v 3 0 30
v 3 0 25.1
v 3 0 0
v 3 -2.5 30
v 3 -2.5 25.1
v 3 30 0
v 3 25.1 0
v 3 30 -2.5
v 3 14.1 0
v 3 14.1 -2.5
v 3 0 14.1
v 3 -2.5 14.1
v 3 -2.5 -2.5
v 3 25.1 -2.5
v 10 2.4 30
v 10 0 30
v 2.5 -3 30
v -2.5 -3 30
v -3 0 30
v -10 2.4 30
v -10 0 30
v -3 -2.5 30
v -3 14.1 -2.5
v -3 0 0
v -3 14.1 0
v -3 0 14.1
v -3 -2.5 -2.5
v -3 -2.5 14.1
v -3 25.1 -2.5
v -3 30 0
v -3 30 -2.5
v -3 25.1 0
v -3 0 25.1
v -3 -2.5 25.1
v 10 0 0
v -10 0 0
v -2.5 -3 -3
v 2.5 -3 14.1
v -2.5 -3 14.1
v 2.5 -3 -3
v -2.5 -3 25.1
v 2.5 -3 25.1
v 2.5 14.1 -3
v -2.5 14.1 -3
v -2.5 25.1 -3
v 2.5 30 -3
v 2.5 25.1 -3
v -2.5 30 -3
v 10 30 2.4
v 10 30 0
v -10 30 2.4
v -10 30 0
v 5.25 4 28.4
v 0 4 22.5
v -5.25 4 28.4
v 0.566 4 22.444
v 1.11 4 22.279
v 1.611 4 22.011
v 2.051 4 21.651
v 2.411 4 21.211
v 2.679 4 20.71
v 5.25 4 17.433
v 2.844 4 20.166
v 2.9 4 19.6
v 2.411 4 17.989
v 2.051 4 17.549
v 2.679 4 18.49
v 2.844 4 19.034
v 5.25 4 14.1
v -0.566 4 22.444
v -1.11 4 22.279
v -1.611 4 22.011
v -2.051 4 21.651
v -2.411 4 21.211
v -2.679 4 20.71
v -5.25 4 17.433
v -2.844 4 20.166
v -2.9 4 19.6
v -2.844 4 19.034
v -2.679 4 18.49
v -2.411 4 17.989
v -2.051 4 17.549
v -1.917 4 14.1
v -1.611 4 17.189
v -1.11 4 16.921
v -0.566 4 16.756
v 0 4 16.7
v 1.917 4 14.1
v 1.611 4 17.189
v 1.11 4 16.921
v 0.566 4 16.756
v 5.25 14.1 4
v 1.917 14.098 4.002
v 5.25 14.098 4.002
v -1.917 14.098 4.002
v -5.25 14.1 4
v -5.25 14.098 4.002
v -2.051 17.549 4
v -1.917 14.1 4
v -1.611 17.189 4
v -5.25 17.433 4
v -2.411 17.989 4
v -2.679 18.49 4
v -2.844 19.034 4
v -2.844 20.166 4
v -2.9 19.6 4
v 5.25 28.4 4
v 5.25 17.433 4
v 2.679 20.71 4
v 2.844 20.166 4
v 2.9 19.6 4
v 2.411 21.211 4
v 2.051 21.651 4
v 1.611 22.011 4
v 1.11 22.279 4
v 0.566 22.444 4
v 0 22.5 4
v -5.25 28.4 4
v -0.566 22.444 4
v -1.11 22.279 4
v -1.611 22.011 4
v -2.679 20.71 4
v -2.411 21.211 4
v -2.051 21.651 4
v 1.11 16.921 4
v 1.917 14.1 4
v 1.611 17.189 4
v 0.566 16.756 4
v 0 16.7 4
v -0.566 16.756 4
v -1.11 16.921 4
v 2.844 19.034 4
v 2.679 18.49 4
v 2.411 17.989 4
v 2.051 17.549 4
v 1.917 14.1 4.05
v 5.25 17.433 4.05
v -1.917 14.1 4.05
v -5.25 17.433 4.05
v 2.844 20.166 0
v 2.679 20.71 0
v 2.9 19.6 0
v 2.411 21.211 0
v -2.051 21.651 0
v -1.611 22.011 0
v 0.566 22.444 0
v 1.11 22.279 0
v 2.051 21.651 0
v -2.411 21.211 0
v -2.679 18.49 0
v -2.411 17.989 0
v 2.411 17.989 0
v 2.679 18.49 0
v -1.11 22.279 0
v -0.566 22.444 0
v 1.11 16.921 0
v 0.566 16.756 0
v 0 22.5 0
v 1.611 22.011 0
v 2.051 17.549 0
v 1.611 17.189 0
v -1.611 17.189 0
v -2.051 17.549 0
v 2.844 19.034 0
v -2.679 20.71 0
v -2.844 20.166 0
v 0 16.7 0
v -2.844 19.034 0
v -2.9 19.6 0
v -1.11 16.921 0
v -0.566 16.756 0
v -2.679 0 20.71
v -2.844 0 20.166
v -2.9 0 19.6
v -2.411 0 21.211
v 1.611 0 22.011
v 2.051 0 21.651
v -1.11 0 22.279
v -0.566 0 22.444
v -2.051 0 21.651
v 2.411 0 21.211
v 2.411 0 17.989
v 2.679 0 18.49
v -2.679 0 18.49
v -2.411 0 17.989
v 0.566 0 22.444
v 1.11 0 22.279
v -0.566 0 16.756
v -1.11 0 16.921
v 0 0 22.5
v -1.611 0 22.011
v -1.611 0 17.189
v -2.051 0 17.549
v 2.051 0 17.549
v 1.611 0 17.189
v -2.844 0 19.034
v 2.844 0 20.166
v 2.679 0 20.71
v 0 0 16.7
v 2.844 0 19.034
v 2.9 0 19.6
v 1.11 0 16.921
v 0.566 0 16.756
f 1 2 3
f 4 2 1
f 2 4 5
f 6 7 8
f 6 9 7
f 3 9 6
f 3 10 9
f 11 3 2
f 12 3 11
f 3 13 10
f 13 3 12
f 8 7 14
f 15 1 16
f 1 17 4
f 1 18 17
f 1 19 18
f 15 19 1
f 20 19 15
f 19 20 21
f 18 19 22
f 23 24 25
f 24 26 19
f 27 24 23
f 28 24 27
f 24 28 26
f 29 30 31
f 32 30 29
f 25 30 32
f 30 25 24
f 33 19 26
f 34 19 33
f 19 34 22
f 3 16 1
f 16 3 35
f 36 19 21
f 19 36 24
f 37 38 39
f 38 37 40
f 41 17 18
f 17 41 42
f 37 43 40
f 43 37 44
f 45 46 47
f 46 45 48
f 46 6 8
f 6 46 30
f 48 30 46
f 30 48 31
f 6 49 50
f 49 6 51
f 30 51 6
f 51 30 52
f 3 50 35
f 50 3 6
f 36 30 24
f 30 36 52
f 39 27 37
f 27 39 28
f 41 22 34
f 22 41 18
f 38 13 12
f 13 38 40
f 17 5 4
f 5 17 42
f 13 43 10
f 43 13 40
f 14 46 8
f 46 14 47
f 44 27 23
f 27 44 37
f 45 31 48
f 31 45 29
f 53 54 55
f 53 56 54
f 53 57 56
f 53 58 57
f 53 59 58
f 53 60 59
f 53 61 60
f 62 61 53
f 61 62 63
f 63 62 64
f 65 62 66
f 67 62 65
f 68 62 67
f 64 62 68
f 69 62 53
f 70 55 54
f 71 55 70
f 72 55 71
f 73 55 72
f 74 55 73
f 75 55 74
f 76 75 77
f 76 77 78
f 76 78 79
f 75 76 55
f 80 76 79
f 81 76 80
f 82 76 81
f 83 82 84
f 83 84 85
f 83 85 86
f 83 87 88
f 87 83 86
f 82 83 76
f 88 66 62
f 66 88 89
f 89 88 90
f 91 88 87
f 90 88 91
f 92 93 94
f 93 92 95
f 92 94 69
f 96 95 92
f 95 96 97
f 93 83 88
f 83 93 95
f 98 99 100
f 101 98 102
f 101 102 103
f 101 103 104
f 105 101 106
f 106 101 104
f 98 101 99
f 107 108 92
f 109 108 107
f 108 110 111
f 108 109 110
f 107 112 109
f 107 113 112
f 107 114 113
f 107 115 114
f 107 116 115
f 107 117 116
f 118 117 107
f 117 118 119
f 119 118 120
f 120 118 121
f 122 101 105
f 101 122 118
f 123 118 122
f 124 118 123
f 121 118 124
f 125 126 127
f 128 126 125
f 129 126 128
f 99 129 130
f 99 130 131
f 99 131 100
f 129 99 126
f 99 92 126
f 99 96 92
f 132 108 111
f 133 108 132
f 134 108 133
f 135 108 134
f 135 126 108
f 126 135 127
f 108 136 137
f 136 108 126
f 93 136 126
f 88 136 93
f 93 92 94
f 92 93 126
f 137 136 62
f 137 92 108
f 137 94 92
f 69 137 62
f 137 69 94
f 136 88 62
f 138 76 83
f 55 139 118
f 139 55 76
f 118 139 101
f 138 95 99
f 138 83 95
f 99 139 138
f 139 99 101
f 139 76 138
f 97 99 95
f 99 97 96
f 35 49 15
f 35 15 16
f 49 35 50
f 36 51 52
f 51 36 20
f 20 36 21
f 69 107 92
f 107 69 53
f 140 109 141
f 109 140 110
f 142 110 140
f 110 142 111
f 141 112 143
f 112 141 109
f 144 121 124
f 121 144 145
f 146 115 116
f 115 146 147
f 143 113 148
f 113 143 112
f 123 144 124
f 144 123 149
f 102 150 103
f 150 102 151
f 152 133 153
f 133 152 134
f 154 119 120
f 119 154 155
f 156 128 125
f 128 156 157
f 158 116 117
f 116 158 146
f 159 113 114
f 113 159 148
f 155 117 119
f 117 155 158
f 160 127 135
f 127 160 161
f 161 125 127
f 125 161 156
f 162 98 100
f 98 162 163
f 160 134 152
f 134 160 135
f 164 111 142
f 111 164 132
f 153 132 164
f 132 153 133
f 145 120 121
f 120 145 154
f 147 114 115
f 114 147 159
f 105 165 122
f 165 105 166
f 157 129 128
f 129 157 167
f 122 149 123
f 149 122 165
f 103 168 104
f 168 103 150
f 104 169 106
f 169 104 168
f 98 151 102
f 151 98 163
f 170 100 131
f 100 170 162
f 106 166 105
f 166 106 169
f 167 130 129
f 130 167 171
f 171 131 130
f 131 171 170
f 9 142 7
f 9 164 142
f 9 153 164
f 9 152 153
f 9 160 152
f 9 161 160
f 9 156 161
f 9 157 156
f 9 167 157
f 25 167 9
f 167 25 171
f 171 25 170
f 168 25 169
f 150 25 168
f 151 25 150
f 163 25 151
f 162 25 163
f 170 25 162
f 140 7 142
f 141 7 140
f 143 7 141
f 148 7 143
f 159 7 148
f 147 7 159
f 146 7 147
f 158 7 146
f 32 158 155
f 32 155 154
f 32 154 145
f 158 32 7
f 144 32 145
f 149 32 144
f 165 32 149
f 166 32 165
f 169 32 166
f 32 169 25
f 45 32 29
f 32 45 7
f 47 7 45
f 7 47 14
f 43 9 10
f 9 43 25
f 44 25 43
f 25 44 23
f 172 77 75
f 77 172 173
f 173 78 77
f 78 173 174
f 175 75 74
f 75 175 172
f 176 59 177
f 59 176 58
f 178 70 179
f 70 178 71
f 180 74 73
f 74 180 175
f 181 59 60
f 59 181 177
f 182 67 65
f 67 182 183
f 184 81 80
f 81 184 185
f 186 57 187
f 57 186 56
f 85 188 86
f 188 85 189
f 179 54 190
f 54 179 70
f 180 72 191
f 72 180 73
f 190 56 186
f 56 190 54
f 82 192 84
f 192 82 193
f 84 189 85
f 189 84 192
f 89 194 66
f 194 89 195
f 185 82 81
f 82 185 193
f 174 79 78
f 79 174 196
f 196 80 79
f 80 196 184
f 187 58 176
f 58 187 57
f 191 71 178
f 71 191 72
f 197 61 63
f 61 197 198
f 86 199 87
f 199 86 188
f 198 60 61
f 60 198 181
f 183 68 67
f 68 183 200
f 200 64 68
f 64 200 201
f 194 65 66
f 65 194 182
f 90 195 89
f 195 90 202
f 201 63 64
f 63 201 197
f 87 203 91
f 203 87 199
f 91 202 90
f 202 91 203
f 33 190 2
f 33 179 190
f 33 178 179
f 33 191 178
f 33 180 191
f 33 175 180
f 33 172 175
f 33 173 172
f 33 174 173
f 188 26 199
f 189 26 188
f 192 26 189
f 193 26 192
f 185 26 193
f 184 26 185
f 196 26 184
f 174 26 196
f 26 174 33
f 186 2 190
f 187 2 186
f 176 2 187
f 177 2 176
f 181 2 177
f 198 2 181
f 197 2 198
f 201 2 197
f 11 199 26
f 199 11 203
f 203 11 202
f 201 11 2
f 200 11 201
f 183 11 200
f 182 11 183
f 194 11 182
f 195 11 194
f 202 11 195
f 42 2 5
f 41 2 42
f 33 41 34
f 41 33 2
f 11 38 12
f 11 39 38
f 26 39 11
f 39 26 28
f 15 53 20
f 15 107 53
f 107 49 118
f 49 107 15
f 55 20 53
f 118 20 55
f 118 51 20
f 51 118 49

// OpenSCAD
/*
* Ultimate Customizable Corner Brackets
* https://www.thingiverse.com/thing:3007147
* By Daniel Hultgren https://www.thingiverse.com/Hultis
* Version 1.3
* 2020-05-07
*/

/* [Basic settings] */

// The width of your aluminium extrusion.
extrusion_width = 20;
// The side length of the bracket.
side_length = 30;
// The thickness of the wall facing the extrusion.
side_thickness = 4;
// How many screw holes are are on the top side.
top_screw_count = 1;
// How many screw holes are are on the bottom side.
bottom_screw_count = 1;
// Screw diameter (4 for M4, 5 for M5 and so on).
screw_hole_size = 5;
// Screw head diameter.
screw_head_size = 10;


/* [Advanced settings] */

// How deep screw heads should be recessed. Obviously don't make this larger than side_thickness.
recessed_screw_depth = 0;
// How much to elongate the holes on top.
top_screw_elongation = 0;
// How much to elongate the holes on bottom.
bottom_screw_elongation = 0;
// The part which goes into your extrusion. Generally this should be slightly smaller than the actual hole, but YMMV.
extrusion_insert_width = 6;
// Use this when you want multiple connected brackets, for 4020 and similar. 20 for 2020 extrusions, 30 for 3030 and so on.
extrusion_base = 20;
// Set to true if you only want a single wall. Not compatible with multiple bracket mode.
single_wall_mode = 0; // [0: false, 1:true]
// Set lower if you think the side walls are too thick.
max_wall_thickness = 8;
// Set this if you want to use these above your existing brackets. Typical 2020 brackets have a size of 20 and side thickness of 3.
cutout_size = 0;
cutout_side_thickness = 3;
// Decrease this if you don't want extrusion inserts on both sides. Intended for using these entirely or partially on non-extrusions.
extrusion_insert_count = 2; // [0, 1, 2]
// Set this to control how much space the nuts have. Hammer nuts should just work but for t nuts you will need to set a specific width.
specific_bottom_nut_space = 0;





/**********************************
   End of config, here be dragons
**********************************/





/* [Hidden] */
// preview[view:north east, tilt:top diagonal]

// You might want to decrease this if you don't use hammer nuts
extrusion_insert_height = 3;

cutout_margin = 0.3;
screw_head_margin = 0.5;
e = 0.05;
top_screw_distance = screw_distance_from_edge(top_screw_count, top_screw_elongation);
bottom_screw_distance = screw_distance_from_edge(bottom_screw_count, bottom_screw_elongation);
screw_distance_from_edge = max(top_screw_distance, bottom_screw_distance);

echo(bridge(top_screw_count, screw_head_size+top_screw_elongation, top_screw_distance));
echo(bridge(bottom_screw_count, screw_head_size+bottom_screw_elongation, bottom_screw_distance));
bridge_size = min(
    bridge(top_screw_count, screw_head_size+top_screw_elongation, top_screw_distance),
    bridge(bottom_screw_count, screw_head_size+bottom_screw_elongation, bottom_screw_distance));

main();

module main() {
    bracket_count = round(extrusion_width / extrusion_base);
    extrusion_width = extrusion_width/bracket_count;
    wall_thickness = min([max_wall_thickness, (extrusion_width - screw_head_size - screw_head_margin) / 2]);
    union() {
        for(i=[0:bracket_count-1]) {
            translate([i*extrusion_width, 0, 0]) bracket(extrusion_width, wall_thickness);
        }
    }
}

module bracket(width, wall_thickness, is_first) {
    difference() {
        union() {
            translate([-width/2, 0, 0]) cube([width, side_length, side_thickness]); // Bottom wall
            translate([-width/2, side_thickness, 0]) rotate([90, 0, 0]) cube([width, side_length, side_thickness]); // Top wall
            translate([width/2 - wall_thickness, 0, 0]) rotate([90, 0, 90]) wall(width, side_length, wall_thickness); // Left wall
            if(!single_wall_mode) {
                translate([-width/2, 0, 0]) rotate([90, 0, 90]) wall(width, side_length, wall_thickness); // Right wall
            }
            
            // Make the parts which go into the extrusions, with chamfers
            if (extrusion_insert_count > 0) difference() {
                union() {
                    if (extrusion_insert_count > 1) {
                        extrusion_insert();
                        translate([-extrusion_insert_width/2, -extrusion_insert_height, -extrusion_insert_height]) cube([extrusion_insert_width, extrusion_insert_height, extrusion_insert_height]);
                    }
                    if(extrusion_insert_count > 0) {
                        translate([0, 0, 0]) rotate([90, 0, 180]) extrusion_insert();
                    }
                    
                }
                extrusion_chamfer();
                translate([0, 0, 0]) rotate([90, 0, 180]) extrusion_chamfer();
            }
            bridge(bridge_size, width, wall_thickness);
        };
        translate([-width/2 - e, side_length + side_thickness*0.6, 0]) rotate([45, 0, 0]) cube([width + e * 2, side_length, side_length*2]); // Cutoff for better printing
        
        // Make screw holes
        side_screw_holes(bottom_screw_count, bottom_screw_distance, bottom_screw_elongation); // Bottom screws
        rotate([270, 180, 0]) side_screw_holes(top_screw_count, top_screw_distance, top_screw_elongation); // Top screws
        cutout();
    }
}

module side_screw_holes(screw_count, screw_distance_from_edge, screw_elongation, screw_distance) {
    screw_total_distance = side_length - screw_distance_from_edge - bridge_size - side_thickness - screw_head_size/2 - screw_head_margin - screw_elongation/2;
    screw_distance = screw_total_distance/(max(1, screw_count-1));
    for(i=[0:screw_count-1]) {
        translate([0, side_length - screw_distance_from_edge - i*screw_distance, -e]) screw(screw_hole_size, screw_head_size, screw_elongation);
    }
}

module cutout() {
    zero = -e-extrusion_insert_height;
    full_width = cutout_size+cutout_margin;
    if (cutout_size > 0) translate([extrusion_width/2+e, 0, 0]) rotate([0, -90, 0]) linear_extrude(height = extrusion_width+2*e, convexity = 2) polygon(points = [
        [zero, zero],
        [zero, full_width],
        [cutout_side_thickness+cutout_margin, full_width],
        [full_width, cutout_side_thickness+cutout_margin],
        [full_width, zero]]);
}

module wall(w, l, wall_thickness) {
    linear_extrude(height = wall_thickness, convexity = 2) polygon(points = [[side_thickness, side_thickness], [side_length, side_thickness], [side_thickness, side_length]]);
}

module screw(hole_size, head_size, screw_elongation = 0) {
    if (screw_elongation > 0) {
        translate([0,screw_elongation/2,-0.5]) cylinder(h = side_thickness + 1, r = hole_size / 2 + 0.4, $fn = 32); // Screw hole
        translate([-hole_size/2-0.4,-screw_elongation/2,-0.5]) cube([hole_size + 0.8, screw_elongation, side_thickness + 1]); // Hole mid part
        translate([0,-screw_elongation/2,-0.5]) cylinder(h = side_thickness + 1, r = hole_size / 2 + 0.4, $fn = 32); // Screw hole
    } else {
        translate([0,0,-0.5]) cylinder(h = side_thickness + 1, r = hole_size / 2 + 0.4, $fn = 32); // Screw hole
    }
    if(recessed_screw_depth > 0) {
        assert(screw_elongation == 0, "Can't use recessed screws with elongated screws");
        translate([0, 0, side_thickness - recessed_screw_depth]) cylinder(h = recessed_screw_depth+1, r = (head_size + screw_head_margin)/2, $fn = 32);
    }
    bottom_nut_space = specific_bottom_nut_space > 0
        ? specific_bottom_nut_space
        : max(screw_hole_size*2+1, screw_hole_size+screw_elongation+1); // This works for typical hammer nuts
    translate([-extrusion_insert_width/2-e, -bottom_nut_space/2, -extrusion_insert_height-e]) cube([extrusion_insert_width + 2*e, bottom_nut_space,extrusion_insert_height+2*e]); // Remove extrusion insert below screw
    #translate([0, 0, side_thickness+2*e]) cylinder(h = 3, r = head_size / 2, $fn = 32); // Screw head, to make sure they don't hit each other
}

module bridge(size, width, wall_thickness) {
    right = width - 2*wall_thickness + 2;
    c = screw_head_size / 3;
    top = size + c;
    x = width/2-wall_thickness-c;
    union() {
        translate([width/2 - e, 0, 0])
            rotate([0, 270, 0])
            linear_extrude(height = width - 2*e, convexity = 2)
            polygon([[side_thickness, side_thickness], [side_thickness + size, side_thickness], [side_thickness, side_thickness + size]]); // Main bridge
        translate([width/2-wall_thickness-c, 0, 0])
            bridge_side(size, [[0, 0], [c, 0], [c, c]]); // Left
        if(!single_wall_mode) {
            translate([-width/2+wall_thickness, 0, 0])
                bridge_side(size, [[0, 0], [c, 0], [0, c]]); // Right
        }
    }
}

module bridge_side(size, polygon_points){
    hull() {
        translate([0, size+side_thickness, side_thickness]) linear_extrude(height = e, convexity = 2) polygon(points = polygon_points);
        translate([0, side_thickness, size+side_thickness]) rotate([90,0,0]) linear_extrude(height = e, convexity = 2) polygon(points = polygon_points);
    }
}

module extrusion_insert() {
    translate([-extrusion_insert_width/2, -extrusion_insert_height, 0]) cube([extrusion_insert_width, extrusion_insert_height, side_length]);
}

module extrusion_chamfer(height = .5) {
    x = extrusion_insert_width;
    z = side_length + extrusion_insert_height;
    length = sqrt(height * height * 2);
    translate([-extrusion_insert_width/2, -extrusion_insert_height, -extrusion_insert_height]) union() {
        translate([0, -height, -e]) rotate([0, 0, 45]) cube([length, length, z+2*e]);
        translate([x, -height, -e]) rotate([0, 0, 45]) cube([length, length, z+2*e]);
    }
}

function screw_distance_from_edge(screw_count, screw_elongation) =
    screw_count > 1
        ? max(screw_head_size/2 + screw_elongation/2, min(6.5, side_length/3)) + screw_head_margin/2
        : max((side_length-side_thickness)/2.5, screw_hole_size+screw_elongation/2);

function bridge(screw_count, total_screw_size, screw_distance_from_edge) =
    screw_count > 1
        ? min((side_length - side_thickness - 2*total_screw_size + cutout_size + cutout_margin) / (side_length/20),
            max(side_length - side_thickness - total_screw_size*screw_count, 0))
        : side_length - screw_distance_from_edge - total_screw_size / 2 - side_thickness - screw_head_margin;
